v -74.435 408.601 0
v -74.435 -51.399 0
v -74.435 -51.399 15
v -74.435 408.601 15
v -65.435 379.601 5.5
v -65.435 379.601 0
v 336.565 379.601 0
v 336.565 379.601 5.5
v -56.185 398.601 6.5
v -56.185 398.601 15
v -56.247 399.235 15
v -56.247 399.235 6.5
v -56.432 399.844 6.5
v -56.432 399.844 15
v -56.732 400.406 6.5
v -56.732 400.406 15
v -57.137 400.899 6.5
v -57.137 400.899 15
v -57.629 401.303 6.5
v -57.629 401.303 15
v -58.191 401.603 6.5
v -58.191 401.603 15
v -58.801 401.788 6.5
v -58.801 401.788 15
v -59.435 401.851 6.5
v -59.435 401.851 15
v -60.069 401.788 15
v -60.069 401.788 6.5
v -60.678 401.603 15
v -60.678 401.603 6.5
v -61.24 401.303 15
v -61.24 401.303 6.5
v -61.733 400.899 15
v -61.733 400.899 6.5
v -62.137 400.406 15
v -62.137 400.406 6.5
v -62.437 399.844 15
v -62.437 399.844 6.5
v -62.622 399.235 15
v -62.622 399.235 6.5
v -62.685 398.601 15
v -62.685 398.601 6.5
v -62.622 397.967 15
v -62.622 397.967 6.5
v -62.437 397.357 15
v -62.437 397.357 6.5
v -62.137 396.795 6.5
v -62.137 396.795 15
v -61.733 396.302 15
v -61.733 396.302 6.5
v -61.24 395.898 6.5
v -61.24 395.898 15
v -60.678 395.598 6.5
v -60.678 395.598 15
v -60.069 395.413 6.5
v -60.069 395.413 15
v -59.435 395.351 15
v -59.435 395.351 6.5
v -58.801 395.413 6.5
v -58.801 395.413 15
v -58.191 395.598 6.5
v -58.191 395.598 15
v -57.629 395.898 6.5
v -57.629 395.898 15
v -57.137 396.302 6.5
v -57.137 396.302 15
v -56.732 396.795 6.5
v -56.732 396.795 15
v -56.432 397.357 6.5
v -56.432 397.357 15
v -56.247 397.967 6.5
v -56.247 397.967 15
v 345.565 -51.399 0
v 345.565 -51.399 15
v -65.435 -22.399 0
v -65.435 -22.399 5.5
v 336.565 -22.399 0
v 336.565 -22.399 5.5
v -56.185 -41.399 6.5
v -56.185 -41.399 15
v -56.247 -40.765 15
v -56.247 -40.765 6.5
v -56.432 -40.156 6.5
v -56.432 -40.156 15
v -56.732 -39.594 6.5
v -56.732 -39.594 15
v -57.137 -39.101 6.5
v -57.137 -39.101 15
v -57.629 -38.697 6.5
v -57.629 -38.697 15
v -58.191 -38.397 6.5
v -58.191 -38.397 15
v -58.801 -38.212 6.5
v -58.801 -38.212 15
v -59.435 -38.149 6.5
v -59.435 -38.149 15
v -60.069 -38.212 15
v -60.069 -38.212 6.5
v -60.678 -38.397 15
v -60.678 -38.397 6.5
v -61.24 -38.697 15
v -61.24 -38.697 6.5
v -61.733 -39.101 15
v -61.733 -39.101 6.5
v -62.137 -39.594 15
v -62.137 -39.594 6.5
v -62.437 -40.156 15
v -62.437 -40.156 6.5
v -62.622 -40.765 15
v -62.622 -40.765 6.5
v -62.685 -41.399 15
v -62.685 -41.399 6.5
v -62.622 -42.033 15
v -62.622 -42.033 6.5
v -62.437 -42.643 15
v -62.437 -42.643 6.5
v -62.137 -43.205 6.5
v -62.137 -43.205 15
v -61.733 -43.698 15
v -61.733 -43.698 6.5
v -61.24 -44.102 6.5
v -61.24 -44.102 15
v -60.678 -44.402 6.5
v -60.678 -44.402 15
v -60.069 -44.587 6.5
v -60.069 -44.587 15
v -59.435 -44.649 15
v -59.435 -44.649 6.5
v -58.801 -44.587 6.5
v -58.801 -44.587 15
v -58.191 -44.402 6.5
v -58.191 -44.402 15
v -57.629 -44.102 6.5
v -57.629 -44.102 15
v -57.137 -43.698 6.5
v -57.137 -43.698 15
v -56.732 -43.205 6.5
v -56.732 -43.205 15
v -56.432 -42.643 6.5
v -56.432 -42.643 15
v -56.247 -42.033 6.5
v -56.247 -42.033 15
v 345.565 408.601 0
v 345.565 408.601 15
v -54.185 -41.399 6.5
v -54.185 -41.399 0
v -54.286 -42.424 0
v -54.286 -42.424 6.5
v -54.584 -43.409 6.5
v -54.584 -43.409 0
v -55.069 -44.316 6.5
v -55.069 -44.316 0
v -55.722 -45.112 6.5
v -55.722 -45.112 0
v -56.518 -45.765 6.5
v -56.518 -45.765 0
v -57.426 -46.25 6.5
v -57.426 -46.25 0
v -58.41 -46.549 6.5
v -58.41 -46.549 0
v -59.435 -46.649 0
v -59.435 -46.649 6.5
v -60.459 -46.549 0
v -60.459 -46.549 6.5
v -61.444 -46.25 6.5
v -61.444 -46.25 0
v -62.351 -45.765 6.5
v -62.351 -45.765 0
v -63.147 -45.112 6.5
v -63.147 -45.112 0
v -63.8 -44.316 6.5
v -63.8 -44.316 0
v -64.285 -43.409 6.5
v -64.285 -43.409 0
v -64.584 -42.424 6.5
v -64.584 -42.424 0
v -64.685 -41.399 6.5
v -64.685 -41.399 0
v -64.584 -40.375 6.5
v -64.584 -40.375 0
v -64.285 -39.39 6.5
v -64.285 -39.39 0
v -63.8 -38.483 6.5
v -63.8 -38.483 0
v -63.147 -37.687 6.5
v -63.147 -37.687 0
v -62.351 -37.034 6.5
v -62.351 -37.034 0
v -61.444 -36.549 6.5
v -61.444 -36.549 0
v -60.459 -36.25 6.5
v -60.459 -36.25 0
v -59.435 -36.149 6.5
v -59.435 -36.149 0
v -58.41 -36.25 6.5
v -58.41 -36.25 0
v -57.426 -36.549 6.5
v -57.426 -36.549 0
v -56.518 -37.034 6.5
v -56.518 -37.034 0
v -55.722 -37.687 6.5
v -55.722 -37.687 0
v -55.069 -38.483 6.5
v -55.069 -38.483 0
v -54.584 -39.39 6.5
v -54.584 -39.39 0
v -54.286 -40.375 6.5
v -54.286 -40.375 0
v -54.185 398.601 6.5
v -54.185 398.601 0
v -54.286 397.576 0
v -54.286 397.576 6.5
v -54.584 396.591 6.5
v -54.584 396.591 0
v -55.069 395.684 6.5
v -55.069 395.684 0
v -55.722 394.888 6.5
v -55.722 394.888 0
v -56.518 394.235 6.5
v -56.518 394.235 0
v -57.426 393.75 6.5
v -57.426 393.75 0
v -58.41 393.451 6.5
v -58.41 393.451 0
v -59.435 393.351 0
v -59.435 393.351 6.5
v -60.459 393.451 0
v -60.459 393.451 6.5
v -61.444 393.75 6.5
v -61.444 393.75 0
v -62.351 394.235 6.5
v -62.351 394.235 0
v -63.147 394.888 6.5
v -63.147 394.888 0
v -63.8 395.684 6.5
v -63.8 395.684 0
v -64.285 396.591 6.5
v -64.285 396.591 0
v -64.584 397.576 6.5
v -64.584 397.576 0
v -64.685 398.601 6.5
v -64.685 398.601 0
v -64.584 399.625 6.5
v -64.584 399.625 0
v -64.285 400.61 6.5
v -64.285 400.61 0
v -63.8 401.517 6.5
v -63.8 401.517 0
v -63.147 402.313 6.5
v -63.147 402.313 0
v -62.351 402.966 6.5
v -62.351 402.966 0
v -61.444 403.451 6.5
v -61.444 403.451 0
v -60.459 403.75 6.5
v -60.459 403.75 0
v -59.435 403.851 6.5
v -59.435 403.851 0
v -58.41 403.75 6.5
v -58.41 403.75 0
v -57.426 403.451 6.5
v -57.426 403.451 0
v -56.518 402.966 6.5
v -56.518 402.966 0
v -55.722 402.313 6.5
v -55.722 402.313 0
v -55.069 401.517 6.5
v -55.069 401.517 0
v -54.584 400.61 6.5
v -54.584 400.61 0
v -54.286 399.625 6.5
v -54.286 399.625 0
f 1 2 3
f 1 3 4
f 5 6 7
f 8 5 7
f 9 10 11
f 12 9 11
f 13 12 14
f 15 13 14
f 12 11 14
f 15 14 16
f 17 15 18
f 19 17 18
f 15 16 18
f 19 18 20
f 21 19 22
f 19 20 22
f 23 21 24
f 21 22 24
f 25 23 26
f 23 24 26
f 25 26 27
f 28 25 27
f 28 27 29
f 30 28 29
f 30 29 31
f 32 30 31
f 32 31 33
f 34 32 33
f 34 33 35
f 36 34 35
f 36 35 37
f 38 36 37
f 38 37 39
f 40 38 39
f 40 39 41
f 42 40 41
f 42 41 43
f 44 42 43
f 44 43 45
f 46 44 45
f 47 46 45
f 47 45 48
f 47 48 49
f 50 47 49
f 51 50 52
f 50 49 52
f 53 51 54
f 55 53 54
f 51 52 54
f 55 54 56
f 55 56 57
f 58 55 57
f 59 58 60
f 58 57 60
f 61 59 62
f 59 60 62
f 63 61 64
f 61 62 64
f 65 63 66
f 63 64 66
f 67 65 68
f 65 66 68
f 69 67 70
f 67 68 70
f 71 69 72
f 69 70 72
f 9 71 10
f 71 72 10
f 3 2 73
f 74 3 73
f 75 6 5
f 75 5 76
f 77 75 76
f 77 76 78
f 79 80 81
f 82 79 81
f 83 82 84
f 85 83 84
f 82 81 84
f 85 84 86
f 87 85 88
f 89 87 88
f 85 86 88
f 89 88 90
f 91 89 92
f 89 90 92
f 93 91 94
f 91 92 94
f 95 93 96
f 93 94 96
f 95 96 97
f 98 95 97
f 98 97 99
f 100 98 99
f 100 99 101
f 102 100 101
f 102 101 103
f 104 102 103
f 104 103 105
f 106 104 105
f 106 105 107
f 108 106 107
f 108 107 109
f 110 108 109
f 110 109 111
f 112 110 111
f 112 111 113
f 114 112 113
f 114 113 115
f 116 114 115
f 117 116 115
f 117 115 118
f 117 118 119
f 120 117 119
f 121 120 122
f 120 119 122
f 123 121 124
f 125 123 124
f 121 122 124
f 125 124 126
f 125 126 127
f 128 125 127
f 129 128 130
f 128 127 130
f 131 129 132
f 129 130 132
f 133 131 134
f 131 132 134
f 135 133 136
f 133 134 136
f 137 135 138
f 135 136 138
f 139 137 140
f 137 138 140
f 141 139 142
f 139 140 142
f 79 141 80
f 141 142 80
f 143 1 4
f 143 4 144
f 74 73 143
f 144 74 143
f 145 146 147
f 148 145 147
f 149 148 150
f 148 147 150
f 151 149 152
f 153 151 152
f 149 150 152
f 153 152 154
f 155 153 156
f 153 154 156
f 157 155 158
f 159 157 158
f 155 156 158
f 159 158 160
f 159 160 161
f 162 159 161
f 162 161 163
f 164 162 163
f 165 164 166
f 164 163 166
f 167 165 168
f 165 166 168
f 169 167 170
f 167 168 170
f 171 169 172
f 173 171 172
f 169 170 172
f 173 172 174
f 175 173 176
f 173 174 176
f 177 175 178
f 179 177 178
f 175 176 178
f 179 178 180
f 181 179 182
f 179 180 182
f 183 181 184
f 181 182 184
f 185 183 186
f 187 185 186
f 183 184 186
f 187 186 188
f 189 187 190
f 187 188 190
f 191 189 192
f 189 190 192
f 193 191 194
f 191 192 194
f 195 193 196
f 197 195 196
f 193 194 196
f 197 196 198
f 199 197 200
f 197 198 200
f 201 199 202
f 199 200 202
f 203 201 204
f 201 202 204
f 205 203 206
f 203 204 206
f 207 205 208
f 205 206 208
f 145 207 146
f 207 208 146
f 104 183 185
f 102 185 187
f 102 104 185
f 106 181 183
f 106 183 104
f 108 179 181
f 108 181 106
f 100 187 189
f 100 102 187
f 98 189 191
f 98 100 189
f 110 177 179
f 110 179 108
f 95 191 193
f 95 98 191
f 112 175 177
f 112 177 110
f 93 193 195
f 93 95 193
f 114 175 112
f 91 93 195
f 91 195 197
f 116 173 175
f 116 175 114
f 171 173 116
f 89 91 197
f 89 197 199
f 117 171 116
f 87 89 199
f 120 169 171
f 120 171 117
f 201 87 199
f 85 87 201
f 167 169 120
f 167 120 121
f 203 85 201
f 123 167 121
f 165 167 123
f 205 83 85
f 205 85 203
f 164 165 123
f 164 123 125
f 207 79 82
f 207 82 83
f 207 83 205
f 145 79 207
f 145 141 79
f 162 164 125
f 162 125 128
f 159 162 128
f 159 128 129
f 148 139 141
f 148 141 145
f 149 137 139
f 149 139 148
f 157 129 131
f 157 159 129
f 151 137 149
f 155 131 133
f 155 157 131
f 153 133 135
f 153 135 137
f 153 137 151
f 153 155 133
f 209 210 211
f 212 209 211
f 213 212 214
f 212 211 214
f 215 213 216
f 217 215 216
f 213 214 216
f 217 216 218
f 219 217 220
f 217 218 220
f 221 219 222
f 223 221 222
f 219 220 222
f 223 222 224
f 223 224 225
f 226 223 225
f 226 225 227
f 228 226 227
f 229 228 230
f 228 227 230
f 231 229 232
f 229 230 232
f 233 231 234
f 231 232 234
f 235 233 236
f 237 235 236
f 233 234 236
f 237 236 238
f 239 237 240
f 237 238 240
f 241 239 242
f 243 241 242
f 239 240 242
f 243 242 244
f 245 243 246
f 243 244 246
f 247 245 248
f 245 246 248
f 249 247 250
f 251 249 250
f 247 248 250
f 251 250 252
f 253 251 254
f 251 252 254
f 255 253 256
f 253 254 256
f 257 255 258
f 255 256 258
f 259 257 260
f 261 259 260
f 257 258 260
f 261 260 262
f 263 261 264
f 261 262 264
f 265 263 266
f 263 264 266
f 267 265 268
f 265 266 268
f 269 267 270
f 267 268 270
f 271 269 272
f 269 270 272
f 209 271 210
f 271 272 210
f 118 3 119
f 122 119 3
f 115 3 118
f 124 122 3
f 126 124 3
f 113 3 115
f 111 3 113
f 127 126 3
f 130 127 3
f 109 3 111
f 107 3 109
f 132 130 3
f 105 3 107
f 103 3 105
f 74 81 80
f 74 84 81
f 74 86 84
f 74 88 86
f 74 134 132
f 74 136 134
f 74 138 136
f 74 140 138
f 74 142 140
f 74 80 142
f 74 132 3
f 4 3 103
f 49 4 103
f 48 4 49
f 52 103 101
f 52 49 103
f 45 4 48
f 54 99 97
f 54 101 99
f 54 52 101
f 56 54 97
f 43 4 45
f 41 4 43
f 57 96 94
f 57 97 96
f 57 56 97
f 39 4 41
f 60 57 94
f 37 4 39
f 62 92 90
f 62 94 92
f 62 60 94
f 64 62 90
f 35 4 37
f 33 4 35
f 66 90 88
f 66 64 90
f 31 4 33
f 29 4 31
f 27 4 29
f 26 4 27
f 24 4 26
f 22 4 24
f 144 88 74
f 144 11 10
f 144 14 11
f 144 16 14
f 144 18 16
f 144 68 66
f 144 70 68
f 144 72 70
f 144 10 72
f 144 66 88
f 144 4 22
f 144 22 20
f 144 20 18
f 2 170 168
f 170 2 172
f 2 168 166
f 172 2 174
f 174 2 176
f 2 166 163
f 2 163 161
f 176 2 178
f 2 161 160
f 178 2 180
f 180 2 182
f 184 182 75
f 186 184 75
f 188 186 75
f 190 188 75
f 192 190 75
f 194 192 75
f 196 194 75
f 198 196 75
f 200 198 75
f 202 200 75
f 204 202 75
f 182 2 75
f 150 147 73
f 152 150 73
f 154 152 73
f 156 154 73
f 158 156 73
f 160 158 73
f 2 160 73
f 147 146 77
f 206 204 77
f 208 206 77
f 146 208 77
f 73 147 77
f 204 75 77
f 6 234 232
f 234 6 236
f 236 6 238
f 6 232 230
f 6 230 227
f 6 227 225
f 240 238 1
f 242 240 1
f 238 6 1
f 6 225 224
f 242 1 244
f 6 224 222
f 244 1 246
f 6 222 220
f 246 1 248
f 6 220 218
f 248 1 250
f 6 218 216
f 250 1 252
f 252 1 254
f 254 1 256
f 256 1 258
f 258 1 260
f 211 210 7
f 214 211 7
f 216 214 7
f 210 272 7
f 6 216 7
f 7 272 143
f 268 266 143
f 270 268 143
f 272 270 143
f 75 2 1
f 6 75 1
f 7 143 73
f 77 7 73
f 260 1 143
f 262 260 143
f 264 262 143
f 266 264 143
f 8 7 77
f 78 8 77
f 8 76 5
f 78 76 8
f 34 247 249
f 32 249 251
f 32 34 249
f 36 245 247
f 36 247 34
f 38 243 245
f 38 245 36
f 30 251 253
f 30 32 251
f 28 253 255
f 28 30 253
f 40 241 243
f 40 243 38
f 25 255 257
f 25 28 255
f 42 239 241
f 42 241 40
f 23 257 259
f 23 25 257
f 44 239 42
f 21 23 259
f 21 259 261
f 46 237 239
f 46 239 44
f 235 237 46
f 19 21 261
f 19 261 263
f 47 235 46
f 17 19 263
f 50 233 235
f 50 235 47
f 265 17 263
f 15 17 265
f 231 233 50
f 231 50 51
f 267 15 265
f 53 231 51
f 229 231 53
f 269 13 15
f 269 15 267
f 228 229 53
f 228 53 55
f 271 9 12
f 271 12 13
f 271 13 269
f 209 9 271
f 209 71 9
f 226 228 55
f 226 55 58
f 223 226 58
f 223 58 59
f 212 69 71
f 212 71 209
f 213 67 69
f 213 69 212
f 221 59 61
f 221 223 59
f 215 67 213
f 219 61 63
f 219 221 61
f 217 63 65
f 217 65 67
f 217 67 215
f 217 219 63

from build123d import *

# Parameters (mm, degrees)
F0_W     = 420
F0_H     = 460
F1_DEPTH = 15
F2_R     = 3.25
F3_DEPTH = 15
F4_W     = 402
F4_H     = 402
F5_DEPTH = 5.5
F6_R     = 5.25
F7_DEPTH = 6.5
F8_DEPTH = 6.5


with BuildPart() as f1:
    # F0 (on Top) → F1 (new body)
    with BuildSketch(Plane.XY):
        with Locations((135.56531, 178.600564)):
            Rectangle(F0_W, F0_H)
    extrude(amount=F1_DEPTH)

    # F2 (on face) → F3 (cut)
    with BuildSketch(Plane.XY.offset(15)):
        with Locations((-59.43469, -41.399436)):
            Circle(F2_R)
        with Locations((-59.43469, 398.600564)):
            Circle(F2_R)
    extrude(amount=-F3_DEPTH, mode=Mode.SUBTRACT)

    # F4 (on face) → F5 (cut)
    with BuildSketch(Plane(origin=(0, 0, 0), x_dir=(1, 0, 0), z_dir=(0, 0, -1))):
        with Locations((135.56531, -178.600564)):
            Rectangle(F4_W, F4_H)
    extrude(amount=-F5_DEPTH, mode=Mode.SUBTRACT)

    # F6 (on face) → F7 (cut)
    with BuildSketch(Plane(origin=(0, 0, 0), x_dir=(1, 0, 0), z_dir=(0, 0, -1))):
        with Locations((-59.43469, -398.600564)):
            Circle(F6_R)
        with Locations((-59.43469, 41.399436)):
            Circle(F6_R)
    extrude(amount=-F7_DEPTH, mode=Mode.SUBTRACT)

    # F6 (on face) → F8 (cut)
    with BuildSketch(Plane(origin=(0, 0, 0), x_dir=(1, 0, 0), z_dir=(0, 0, -1))):
        with Locations((-59.43469, -398.600564)):
            Circle(F6_R)
        with Locations((-59.43469, 41.399436)):
            Circle(F6_R)
    extrude(amount=-F8_DEPTH, mode=Mode.SUBTRACT)


solid = f1.part
